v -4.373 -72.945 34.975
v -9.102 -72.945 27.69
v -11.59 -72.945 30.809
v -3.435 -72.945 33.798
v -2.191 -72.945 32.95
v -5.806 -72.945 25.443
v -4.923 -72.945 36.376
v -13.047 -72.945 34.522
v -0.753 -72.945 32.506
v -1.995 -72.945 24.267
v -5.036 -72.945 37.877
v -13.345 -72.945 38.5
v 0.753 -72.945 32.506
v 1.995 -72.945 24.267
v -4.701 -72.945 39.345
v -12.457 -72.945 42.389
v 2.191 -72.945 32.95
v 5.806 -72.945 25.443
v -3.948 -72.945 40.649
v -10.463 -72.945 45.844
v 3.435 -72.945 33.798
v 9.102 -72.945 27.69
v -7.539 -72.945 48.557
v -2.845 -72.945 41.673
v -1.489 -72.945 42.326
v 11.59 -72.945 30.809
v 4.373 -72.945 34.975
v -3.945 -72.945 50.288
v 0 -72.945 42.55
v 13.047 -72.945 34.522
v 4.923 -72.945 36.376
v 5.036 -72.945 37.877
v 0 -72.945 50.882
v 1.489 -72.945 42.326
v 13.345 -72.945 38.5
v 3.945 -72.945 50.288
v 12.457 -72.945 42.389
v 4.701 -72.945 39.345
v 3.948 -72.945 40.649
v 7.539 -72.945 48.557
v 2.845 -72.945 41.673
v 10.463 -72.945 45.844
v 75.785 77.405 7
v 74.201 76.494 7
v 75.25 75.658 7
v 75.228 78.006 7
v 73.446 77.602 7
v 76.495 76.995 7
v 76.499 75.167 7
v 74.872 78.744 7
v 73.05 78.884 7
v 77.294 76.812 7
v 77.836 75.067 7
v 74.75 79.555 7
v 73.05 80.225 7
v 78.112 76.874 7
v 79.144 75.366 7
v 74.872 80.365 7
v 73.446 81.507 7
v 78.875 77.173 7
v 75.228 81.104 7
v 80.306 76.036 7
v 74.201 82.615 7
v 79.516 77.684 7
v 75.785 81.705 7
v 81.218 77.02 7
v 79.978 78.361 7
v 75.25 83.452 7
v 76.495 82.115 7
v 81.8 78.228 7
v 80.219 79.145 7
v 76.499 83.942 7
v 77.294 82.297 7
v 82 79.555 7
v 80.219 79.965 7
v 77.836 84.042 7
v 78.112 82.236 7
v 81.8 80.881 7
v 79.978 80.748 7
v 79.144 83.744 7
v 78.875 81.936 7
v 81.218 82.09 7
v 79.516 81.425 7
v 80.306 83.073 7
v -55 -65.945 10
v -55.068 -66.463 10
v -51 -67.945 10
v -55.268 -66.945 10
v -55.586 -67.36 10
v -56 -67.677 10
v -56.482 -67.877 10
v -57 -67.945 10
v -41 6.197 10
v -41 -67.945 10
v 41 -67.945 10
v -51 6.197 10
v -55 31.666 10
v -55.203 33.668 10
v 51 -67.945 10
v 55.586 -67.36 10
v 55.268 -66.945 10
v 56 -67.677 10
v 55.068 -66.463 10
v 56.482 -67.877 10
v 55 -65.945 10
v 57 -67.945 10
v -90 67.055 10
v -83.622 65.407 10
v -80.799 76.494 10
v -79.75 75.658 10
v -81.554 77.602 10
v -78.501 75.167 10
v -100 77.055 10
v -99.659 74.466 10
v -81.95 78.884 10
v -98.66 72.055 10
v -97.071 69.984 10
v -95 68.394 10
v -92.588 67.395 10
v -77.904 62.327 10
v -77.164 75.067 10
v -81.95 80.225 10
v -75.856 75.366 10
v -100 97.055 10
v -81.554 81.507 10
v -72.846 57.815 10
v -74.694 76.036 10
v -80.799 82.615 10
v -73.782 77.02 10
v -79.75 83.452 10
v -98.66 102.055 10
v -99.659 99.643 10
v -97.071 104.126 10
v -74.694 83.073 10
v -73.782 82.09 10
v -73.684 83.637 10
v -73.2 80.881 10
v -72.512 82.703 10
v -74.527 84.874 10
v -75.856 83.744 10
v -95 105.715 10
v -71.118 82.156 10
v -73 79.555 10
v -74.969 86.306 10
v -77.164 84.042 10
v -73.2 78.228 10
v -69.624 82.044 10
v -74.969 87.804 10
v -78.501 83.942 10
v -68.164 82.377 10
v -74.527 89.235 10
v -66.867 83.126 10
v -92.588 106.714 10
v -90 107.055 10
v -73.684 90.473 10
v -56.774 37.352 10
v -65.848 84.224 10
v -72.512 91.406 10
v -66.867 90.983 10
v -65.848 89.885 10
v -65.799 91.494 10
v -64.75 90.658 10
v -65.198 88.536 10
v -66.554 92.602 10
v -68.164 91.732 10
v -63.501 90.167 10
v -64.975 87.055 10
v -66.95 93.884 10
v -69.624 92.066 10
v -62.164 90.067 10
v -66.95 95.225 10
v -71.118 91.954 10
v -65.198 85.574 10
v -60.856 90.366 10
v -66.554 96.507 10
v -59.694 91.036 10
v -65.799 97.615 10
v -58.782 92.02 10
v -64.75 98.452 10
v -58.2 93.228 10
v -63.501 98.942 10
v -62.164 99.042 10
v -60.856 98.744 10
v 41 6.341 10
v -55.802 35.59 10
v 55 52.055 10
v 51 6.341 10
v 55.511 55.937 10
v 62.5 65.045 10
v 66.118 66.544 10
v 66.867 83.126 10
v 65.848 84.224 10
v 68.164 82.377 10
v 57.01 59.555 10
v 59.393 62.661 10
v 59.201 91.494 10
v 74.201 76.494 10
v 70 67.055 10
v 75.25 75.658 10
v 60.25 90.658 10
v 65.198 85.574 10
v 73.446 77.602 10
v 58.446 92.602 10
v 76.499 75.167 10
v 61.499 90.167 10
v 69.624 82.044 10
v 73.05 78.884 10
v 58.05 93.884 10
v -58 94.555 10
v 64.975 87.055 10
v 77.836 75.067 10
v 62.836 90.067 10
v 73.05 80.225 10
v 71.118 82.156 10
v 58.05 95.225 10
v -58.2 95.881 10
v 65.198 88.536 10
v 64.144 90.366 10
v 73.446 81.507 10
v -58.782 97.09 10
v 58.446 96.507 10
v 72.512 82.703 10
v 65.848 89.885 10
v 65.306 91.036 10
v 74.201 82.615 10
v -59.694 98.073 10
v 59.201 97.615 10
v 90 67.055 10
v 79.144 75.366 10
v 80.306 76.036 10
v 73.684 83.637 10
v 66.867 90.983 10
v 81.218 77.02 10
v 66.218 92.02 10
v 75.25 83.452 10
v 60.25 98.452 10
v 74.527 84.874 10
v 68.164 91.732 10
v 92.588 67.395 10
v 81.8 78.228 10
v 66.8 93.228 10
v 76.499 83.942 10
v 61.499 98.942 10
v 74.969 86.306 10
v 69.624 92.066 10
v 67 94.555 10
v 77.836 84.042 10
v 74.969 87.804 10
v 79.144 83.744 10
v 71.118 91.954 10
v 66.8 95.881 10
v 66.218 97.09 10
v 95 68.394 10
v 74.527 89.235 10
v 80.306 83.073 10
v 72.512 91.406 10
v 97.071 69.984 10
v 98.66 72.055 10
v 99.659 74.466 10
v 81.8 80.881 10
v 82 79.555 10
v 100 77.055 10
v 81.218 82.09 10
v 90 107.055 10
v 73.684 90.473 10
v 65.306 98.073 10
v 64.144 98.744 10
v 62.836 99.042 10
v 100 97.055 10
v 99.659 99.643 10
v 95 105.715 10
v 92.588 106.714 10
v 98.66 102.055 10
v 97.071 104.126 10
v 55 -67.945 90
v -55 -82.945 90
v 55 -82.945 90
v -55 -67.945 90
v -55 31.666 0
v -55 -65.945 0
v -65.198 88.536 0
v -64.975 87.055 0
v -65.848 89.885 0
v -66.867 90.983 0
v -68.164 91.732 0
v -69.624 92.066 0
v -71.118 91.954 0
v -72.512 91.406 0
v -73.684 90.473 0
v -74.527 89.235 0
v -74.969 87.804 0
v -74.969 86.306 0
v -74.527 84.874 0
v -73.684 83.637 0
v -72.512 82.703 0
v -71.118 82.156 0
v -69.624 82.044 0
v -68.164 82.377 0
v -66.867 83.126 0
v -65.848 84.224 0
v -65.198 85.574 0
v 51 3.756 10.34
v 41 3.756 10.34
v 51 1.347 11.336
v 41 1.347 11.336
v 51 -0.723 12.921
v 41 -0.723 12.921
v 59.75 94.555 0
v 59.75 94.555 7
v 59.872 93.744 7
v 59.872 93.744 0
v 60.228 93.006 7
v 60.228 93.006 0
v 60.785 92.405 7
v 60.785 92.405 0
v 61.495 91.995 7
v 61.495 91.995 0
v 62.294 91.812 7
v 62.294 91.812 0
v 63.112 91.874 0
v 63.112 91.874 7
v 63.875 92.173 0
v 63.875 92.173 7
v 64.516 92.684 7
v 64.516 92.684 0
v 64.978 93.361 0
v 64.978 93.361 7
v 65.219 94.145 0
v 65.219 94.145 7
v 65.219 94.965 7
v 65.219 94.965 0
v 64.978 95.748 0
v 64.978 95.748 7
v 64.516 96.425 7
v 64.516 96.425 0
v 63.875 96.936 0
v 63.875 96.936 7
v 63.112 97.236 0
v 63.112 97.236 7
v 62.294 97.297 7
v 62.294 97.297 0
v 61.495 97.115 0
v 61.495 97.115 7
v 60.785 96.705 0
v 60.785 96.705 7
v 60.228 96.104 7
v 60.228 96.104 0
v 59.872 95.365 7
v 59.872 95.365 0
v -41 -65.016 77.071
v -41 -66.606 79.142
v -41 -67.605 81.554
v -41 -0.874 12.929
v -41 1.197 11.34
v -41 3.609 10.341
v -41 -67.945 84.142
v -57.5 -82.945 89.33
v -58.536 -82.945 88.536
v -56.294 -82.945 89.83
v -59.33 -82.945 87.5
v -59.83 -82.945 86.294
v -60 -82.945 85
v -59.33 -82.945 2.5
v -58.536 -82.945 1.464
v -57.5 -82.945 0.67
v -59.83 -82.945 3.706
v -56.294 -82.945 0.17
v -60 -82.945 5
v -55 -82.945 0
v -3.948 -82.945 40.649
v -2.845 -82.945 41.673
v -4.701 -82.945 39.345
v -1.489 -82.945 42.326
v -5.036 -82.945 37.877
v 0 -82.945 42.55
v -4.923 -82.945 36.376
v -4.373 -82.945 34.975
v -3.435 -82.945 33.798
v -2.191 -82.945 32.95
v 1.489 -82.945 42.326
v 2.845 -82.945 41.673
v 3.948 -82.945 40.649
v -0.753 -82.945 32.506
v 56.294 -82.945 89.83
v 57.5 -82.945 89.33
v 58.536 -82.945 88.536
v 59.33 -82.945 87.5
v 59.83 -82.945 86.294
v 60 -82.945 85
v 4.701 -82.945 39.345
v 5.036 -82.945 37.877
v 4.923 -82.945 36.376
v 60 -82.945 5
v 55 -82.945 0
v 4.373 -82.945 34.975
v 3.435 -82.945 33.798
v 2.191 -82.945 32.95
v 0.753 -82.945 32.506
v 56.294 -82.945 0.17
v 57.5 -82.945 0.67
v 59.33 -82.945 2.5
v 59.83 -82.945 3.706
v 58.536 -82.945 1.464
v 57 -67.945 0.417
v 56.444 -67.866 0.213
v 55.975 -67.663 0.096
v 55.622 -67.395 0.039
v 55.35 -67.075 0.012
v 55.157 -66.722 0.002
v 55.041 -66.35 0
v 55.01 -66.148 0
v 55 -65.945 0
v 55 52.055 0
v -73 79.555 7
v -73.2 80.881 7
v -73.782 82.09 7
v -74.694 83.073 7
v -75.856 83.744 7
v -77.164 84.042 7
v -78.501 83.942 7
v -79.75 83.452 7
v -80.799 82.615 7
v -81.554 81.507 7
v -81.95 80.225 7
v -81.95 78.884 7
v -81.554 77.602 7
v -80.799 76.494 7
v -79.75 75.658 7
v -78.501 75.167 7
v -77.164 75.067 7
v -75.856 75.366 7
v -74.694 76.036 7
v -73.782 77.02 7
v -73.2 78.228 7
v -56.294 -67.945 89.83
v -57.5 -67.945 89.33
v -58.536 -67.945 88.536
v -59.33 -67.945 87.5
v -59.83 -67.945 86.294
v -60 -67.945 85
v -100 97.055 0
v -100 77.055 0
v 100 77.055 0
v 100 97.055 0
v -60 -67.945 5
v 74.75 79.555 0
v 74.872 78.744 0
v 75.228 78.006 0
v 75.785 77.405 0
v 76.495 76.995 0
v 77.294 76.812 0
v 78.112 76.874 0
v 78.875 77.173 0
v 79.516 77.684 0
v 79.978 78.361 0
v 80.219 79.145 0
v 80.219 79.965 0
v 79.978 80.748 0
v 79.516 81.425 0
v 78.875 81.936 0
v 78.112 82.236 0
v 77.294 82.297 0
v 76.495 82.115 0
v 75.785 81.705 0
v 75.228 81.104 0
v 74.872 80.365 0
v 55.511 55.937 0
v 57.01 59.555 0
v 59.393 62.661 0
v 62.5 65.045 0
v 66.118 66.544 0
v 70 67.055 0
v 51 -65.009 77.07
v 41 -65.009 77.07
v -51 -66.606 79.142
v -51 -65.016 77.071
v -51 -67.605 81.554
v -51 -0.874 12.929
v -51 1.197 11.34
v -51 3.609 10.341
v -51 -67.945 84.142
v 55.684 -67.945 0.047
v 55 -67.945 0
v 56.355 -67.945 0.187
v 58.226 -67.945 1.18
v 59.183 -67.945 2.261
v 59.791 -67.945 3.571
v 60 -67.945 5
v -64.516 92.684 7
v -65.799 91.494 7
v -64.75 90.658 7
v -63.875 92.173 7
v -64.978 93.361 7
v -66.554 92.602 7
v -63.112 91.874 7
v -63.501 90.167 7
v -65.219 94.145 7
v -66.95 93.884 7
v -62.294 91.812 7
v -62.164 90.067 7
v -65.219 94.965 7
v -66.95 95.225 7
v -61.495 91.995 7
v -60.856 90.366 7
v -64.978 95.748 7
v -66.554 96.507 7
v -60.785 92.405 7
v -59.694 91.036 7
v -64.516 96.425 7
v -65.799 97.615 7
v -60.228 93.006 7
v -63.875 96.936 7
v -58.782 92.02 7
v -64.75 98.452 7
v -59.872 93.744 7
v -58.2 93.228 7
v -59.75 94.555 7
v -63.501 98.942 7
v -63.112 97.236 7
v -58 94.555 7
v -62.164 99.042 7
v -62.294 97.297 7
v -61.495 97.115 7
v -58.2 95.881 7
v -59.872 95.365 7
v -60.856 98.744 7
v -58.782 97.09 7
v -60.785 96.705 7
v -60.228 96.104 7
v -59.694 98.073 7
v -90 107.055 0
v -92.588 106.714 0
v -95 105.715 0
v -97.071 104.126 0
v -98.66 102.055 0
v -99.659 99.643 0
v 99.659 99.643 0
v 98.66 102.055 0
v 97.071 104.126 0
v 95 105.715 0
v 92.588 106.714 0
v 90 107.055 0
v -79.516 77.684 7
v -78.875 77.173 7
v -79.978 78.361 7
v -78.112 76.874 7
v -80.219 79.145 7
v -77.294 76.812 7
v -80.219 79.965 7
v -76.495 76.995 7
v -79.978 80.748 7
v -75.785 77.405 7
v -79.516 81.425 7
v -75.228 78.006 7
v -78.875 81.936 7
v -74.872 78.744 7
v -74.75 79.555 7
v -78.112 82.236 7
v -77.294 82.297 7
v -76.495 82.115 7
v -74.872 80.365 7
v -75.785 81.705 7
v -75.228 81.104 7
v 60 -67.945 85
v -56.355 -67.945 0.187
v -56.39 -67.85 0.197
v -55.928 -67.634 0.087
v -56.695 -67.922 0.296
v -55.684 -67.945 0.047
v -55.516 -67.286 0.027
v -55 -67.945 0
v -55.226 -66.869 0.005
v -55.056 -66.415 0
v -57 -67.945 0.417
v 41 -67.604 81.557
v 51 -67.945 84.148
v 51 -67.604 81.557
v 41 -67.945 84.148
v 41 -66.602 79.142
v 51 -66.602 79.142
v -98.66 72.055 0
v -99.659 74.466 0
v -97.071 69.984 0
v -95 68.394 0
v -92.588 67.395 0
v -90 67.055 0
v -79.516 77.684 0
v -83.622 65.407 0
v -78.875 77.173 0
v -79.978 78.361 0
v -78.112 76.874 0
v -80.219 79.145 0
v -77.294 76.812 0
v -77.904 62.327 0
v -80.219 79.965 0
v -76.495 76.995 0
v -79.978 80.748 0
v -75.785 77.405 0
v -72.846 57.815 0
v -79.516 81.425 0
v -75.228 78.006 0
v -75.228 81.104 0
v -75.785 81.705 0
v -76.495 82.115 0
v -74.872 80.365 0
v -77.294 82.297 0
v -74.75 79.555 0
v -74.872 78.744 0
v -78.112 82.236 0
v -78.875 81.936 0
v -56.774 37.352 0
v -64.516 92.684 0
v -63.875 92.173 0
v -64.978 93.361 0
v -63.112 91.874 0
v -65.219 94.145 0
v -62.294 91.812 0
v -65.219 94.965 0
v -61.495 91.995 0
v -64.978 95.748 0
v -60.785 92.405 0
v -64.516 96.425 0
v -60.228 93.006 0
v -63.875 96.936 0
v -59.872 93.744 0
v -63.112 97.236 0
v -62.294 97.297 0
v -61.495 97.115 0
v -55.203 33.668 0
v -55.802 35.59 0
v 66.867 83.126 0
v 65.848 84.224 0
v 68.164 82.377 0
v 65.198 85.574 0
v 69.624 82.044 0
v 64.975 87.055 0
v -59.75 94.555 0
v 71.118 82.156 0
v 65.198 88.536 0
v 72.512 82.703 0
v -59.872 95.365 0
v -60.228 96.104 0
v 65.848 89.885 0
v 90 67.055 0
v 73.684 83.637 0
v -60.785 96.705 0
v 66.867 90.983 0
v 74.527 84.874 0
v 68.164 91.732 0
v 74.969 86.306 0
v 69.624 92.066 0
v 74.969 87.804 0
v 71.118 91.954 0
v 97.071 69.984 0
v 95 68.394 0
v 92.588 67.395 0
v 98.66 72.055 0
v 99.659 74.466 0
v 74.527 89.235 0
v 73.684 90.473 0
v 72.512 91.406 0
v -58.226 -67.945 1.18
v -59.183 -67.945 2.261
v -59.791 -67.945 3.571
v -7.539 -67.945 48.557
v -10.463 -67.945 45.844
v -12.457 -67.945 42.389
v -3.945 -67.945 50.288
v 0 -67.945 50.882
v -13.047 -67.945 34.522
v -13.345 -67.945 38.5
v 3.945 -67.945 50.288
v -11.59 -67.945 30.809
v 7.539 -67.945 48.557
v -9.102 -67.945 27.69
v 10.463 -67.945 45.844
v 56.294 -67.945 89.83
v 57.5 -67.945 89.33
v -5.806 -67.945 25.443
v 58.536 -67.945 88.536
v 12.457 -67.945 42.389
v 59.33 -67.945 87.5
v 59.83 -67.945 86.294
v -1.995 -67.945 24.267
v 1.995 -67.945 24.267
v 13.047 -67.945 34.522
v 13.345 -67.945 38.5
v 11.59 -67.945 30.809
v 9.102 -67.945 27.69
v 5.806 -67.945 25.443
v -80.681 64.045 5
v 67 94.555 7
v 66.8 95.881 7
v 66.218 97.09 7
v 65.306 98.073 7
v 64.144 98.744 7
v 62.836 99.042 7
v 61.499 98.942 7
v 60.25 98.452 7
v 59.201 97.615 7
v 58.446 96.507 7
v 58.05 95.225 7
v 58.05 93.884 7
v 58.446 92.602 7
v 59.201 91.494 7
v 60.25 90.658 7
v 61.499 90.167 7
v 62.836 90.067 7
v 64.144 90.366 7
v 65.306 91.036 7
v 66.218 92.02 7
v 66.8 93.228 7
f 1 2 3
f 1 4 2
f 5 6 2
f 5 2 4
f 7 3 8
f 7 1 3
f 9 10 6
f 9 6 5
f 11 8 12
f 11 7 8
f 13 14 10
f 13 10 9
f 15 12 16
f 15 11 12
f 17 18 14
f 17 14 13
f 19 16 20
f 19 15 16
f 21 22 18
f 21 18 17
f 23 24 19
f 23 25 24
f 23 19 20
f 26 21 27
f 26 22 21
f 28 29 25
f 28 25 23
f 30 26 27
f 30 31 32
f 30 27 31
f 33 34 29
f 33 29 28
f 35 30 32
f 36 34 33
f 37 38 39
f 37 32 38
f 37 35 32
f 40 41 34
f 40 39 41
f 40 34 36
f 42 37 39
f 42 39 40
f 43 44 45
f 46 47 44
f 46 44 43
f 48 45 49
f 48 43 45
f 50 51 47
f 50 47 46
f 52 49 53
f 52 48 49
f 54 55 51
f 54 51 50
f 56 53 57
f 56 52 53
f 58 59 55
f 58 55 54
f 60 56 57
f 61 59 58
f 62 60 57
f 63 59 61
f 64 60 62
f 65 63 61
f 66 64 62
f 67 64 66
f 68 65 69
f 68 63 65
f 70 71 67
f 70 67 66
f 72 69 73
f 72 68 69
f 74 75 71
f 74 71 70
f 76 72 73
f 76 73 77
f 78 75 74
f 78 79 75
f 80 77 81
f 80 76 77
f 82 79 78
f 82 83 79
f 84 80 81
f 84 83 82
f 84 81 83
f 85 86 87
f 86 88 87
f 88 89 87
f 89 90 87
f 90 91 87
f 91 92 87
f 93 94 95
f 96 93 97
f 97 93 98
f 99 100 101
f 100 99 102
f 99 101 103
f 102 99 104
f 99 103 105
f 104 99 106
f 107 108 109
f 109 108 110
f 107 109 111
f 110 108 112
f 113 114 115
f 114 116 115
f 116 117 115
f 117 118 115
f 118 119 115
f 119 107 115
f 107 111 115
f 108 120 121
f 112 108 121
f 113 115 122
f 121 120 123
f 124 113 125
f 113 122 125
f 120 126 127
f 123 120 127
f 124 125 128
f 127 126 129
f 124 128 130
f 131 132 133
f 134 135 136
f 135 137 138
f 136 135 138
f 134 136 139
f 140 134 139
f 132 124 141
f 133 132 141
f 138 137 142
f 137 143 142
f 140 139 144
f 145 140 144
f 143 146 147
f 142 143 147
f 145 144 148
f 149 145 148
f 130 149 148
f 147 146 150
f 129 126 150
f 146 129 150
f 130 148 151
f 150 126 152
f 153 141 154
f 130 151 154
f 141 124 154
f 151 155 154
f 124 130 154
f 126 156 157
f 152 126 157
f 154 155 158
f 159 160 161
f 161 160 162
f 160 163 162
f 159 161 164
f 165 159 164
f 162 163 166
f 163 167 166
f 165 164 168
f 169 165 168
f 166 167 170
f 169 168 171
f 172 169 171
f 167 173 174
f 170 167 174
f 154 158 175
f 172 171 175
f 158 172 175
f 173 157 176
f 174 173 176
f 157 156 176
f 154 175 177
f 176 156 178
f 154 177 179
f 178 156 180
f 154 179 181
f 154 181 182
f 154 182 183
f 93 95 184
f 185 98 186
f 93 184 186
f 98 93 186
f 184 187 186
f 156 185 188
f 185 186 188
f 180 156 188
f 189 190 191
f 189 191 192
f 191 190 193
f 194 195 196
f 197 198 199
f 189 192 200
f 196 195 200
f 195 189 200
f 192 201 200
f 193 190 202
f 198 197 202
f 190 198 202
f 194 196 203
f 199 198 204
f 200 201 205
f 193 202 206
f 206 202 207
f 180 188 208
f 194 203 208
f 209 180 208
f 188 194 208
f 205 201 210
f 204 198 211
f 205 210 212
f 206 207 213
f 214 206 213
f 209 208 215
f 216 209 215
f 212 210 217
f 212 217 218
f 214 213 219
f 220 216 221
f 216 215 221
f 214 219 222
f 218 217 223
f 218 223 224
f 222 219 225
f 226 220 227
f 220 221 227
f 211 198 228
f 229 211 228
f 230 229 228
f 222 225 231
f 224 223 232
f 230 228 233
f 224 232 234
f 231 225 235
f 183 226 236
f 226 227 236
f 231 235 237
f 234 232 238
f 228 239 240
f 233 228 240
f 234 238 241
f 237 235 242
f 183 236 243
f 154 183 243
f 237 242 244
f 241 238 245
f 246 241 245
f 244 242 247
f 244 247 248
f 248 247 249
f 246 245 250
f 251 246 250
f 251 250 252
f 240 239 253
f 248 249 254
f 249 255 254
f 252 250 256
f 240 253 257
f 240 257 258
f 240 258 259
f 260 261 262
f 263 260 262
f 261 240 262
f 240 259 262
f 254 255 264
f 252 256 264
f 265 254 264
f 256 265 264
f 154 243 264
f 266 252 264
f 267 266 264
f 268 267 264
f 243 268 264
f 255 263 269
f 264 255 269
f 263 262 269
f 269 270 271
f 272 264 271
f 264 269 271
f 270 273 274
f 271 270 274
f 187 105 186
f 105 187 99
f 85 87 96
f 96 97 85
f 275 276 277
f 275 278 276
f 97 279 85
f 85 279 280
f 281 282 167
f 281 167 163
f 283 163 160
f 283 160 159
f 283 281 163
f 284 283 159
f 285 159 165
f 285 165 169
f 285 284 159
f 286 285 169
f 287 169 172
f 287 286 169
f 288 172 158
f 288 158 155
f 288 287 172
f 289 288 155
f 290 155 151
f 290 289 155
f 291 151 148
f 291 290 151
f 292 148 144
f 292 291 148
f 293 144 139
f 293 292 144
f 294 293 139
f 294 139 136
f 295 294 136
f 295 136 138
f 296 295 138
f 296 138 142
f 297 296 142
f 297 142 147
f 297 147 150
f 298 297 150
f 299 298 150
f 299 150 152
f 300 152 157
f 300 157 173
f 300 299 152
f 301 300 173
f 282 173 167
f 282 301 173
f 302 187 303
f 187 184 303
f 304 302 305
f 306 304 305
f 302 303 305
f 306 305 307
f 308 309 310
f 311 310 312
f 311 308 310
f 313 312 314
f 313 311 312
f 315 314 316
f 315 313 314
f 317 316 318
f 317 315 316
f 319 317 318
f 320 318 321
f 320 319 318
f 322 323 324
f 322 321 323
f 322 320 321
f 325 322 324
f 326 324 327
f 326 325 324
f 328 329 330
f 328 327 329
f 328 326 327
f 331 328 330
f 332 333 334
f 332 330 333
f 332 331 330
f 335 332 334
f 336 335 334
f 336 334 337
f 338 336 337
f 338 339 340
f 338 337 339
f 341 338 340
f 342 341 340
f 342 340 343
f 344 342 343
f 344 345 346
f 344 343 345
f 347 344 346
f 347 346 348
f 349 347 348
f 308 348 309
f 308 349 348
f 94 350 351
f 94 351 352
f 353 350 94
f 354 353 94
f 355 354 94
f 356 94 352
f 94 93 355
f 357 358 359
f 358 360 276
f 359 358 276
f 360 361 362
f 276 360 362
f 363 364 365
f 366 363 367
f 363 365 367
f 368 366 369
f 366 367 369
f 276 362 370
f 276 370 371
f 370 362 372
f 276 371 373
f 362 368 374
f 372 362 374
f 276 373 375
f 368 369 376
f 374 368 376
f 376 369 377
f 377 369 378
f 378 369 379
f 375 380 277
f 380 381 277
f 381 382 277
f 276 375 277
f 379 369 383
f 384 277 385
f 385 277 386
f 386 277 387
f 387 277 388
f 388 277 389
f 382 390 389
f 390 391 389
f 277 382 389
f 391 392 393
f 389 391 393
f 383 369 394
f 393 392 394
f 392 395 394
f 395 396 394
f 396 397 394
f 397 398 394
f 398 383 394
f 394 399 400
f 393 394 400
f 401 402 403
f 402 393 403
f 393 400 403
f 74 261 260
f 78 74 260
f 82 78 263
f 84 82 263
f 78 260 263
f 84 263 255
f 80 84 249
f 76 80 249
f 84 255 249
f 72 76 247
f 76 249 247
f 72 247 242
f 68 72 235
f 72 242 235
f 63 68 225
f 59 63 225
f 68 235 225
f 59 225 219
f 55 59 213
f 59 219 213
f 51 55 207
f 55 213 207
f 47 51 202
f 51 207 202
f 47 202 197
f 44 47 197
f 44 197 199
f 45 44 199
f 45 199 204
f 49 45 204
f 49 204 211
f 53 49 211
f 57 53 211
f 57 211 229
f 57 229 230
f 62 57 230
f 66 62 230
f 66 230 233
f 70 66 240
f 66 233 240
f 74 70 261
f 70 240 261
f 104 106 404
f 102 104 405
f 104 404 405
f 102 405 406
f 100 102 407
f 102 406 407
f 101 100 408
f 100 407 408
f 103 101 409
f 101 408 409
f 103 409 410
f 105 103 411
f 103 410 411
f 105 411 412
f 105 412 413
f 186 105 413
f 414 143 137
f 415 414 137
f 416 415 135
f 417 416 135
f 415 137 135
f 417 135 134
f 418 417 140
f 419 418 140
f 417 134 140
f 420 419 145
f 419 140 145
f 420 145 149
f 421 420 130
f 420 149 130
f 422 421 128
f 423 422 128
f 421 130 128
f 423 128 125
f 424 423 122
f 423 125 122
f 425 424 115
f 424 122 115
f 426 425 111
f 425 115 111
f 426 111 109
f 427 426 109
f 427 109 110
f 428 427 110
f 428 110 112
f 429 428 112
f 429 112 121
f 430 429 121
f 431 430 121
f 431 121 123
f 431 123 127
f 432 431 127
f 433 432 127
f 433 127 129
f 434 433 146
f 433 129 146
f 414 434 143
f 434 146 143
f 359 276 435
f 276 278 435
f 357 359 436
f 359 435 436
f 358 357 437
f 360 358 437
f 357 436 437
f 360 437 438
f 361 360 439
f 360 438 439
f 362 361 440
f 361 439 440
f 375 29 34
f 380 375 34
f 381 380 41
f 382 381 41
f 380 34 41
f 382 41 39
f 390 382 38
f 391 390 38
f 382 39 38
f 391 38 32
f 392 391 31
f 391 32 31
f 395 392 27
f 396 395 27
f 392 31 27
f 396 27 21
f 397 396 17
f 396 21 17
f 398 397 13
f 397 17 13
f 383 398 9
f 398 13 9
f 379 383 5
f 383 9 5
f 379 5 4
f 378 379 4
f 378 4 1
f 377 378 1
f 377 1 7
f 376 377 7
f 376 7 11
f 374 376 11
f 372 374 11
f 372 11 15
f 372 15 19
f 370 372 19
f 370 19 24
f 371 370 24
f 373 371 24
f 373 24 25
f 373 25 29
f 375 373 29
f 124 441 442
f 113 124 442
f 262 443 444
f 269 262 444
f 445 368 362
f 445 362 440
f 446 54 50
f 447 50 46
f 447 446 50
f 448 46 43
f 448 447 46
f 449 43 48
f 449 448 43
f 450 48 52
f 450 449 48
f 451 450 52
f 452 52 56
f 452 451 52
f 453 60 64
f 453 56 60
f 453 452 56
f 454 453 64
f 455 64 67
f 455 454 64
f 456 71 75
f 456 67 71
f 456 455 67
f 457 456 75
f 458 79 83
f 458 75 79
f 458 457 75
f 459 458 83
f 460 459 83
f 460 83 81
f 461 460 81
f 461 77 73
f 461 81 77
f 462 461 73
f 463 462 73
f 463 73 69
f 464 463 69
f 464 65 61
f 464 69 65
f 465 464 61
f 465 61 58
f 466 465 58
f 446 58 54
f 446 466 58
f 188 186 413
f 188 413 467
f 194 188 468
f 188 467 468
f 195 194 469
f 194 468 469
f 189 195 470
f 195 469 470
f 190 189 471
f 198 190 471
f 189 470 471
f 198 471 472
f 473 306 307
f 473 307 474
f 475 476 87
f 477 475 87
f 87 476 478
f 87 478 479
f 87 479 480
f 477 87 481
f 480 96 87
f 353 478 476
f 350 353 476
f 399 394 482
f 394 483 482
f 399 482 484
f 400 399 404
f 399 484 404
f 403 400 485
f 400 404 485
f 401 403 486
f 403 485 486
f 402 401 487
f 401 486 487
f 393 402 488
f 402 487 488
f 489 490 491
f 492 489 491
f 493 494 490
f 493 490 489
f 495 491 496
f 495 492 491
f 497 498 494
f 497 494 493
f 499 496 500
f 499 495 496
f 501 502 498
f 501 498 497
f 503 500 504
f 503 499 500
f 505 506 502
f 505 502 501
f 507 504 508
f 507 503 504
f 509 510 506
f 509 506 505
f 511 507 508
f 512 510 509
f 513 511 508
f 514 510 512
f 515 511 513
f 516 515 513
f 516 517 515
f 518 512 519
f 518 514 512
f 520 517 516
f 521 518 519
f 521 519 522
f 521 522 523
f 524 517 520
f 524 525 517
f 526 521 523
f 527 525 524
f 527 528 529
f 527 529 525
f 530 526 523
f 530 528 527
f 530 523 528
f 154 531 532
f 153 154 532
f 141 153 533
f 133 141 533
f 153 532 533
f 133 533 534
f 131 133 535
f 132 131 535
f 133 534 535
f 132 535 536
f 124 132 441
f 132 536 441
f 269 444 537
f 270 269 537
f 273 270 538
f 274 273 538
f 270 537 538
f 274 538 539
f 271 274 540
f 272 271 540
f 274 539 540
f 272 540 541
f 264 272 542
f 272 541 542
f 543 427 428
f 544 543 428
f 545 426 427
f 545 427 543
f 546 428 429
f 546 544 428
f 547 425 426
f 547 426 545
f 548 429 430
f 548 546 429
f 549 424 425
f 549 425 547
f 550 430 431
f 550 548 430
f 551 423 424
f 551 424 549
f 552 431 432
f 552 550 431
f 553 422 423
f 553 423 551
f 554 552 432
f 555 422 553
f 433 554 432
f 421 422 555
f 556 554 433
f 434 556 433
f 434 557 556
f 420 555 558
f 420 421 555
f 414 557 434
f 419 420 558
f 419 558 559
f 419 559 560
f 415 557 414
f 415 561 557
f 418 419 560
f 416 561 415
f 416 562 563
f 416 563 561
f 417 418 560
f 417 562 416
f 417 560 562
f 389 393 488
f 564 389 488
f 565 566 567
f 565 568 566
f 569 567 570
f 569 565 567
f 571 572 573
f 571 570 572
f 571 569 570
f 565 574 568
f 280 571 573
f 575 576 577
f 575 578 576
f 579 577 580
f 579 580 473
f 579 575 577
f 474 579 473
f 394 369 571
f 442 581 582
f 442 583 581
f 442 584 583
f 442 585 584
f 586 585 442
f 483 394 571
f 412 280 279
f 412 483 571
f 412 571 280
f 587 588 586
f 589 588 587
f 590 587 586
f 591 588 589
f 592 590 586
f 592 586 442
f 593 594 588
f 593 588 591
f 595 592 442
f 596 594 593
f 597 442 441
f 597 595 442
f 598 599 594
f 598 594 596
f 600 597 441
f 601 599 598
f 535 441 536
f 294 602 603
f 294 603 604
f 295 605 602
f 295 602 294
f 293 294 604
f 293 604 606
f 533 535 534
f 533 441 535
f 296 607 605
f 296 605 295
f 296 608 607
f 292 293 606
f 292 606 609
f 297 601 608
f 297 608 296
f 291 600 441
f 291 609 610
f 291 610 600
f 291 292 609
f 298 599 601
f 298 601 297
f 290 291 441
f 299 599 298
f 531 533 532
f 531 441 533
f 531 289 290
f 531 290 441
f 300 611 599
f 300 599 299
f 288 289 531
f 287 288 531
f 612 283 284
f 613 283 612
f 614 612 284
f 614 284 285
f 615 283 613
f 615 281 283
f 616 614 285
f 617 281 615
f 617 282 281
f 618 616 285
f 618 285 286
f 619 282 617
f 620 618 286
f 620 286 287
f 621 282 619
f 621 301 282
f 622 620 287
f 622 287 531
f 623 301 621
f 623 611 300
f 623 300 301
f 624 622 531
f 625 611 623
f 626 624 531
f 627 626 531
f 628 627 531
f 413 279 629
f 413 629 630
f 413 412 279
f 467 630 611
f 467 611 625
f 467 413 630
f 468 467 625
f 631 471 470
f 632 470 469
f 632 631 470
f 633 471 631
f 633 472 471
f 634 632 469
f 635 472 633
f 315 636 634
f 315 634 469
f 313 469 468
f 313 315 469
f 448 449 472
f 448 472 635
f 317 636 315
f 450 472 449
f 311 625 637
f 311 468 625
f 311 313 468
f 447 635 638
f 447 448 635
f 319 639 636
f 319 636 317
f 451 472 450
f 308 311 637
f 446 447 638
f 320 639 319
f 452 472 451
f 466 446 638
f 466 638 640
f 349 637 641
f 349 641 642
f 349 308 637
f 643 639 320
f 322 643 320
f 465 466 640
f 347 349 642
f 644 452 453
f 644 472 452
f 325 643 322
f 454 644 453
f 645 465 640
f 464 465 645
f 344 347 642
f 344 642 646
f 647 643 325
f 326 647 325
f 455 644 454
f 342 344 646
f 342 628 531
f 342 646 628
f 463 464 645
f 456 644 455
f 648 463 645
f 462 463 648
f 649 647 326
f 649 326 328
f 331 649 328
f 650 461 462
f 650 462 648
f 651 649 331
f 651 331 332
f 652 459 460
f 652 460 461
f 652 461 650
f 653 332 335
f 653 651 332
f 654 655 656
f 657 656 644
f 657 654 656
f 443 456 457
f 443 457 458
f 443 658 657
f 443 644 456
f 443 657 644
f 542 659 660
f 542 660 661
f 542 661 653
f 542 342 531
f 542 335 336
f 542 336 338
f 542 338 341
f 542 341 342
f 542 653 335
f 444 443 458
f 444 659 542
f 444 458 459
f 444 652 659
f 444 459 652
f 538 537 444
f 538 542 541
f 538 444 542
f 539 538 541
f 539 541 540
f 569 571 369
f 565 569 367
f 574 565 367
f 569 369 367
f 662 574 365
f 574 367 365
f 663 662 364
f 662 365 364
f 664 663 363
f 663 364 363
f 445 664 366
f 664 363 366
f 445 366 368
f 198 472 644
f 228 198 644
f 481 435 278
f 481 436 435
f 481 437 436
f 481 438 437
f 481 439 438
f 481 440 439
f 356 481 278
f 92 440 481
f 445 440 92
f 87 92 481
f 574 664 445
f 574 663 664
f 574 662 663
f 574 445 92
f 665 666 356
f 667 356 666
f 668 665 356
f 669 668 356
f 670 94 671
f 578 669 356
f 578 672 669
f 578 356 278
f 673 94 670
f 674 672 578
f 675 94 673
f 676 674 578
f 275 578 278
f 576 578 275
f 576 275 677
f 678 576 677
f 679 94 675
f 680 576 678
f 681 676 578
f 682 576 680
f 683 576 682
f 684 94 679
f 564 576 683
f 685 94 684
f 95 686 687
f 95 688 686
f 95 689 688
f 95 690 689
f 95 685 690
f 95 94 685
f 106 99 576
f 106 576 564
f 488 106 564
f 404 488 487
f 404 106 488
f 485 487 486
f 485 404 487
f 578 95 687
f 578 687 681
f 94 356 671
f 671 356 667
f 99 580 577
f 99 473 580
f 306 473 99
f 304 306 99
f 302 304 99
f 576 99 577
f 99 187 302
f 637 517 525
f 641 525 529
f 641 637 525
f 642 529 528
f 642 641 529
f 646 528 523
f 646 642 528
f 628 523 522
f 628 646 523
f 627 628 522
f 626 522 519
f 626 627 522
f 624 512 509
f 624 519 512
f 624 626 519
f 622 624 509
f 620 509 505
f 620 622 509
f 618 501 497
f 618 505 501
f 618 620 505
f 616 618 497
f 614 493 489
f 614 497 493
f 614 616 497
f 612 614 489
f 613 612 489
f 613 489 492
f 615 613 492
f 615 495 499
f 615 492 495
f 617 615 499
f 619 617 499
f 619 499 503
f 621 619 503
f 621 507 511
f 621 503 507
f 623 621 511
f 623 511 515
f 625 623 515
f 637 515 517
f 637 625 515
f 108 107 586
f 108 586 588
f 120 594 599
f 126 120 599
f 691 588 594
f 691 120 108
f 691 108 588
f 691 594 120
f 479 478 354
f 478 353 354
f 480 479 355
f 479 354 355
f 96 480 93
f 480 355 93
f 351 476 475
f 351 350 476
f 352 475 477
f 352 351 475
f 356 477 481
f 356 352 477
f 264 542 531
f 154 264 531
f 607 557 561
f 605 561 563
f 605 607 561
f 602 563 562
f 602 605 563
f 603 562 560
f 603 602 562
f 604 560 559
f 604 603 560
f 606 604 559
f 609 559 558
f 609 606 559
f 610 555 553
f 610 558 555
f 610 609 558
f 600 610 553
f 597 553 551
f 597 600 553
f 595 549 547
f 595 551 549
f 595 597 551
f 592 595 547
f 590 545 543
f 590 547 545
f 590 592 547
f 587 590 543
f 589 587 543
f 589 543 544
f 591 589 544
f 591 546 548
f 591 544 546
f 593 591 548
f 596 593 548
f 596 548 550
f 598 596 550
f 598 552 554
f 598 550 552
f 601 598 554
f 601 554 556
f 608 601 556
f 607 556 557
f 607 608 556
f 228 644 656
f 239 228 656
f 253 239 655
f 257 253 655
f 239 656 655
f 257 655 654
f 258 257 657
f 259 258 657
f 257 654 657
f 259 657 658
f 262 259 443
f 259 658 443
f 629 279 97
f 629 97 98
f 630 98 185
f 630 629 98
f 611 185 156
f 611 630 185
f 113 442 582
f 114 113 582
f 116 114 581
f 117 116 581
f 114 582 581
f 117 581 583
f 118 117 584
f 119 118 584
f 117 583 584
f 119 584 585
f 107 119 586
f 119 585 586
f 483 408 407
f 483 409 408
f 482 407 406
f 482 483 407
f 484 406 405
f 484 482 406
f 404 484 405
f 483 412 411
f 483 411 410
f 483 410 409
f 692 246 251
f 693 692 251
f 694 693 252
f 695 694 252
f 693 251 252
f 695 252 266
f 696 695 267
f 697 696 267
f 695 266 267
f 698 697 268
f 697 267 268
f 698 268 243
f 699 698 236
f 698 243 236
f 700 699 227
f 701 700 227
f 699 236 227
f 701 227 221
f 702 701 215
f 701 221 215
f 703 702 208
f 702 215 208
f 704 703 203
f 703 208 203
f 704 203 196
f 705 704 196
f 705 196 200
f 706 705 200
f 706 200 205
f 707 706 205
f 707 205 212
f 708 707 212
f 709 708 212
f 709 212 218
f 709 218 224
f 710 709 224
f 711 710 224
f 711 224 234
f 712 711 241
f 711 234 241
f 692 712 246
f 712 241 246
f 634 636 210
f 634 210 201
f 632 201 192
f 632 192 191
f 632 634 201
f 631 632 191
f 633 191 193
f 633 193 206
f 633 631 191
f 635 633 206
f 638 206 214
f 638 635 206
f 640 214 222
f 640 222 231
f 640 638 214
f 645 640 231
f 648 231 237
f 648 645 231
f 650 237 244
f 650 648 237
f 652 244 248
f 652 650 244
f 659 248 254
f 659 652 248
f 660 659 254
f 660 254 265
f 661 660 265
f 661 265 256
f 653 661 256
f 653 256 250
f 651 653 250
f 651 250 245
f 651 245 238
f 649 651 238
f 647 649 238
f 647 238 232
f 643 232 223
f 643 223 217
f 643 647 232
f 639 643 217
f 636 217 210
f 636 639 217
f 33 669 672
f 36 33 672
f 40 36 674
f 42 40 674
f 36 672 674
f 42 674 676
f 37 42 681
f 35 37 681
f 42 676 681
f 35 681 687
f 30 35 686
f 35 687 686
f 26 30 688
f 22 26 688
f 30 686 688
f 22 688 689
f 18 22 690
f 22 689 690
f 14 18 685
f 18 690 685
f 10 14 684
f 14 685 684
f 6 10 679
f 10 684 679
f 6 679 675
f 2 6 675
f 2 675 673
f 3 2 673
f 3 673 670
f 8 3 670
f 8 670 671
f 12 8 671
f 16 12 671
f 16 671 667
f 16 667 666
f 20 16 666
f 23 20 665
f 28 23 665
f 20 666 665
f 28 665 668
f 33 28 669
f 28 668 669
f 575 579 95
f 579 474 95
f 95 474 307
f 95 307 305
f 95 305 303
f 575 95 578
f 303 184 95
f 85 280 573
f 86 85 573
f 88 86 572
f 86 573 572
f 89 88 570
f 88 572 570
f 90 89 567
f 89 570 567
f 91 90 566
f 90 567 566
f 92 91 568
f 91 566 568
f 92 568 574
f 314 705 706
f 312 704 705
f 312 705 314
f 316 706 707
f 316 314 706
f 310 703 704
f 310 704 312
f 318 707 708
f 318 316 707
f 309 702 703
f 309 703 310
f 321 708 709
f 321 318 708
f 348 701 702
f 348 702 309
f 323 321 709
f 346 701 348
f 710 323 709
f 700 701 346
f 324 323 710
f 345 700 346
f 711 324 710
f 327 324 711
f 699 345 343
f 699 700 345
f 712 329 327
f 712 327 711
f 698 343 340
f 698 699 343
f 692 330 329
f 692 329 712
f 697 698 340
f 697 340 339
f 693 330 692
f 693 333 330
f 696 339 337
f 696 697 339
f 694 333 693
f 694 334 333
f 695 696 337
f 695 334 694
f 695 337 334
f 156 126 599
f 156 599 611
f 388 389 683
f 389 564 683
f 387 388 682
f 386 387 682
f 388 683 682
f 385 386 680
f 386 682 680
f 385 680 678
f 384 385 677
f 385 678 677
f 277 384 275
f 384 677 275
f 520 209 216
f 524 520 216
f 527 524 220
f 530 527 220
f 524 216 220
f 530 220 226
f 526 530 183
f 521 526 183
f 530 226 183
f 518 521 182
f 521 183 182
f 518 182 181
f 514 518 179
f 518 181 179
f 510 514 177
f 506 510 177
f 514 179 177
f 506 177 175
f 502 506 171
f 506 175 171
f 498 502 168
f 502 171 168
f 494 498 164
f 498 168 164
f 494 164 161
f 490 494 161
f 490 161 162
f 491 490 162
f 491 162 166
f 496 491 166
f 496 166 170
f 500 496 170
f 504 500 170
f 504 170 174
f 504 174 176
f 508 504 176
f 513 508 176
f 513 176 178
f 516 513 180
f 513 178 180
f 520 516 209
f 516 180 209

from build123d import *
from OCP.BRepAlgoAPI import BRepAlgoAPI_Cut
from OCP.TopTools import TopTools_ListOfShape

# Parameters (mm, degrees)
SKIZZE1_R                       = 5.025
SKIZZE1_R_2                     = 2.75
AUFSATZ_LINEAR_AUSTRAGEN1_DEPTH = 10
AUFSATZ_LINEAR_AUSTRAGEN3_DEPTH = 10
SKIZZE4_W                       = 120
SKIZZE4_H                       = 15
AUFSATZ_LINEAR_AUSTRAGEN4_DEPTH = 80
AUFSATZ_LINEAR_AUSTRAGEN5_DEPTH = 10
AUFSATZ_LINEAR_AUSTRAGEN6_DEPTH = 10
VERRUNDUNG3_R                   = 10
VERRUNDUNG4_R                   = 5
VERRUNDUNG5_R                   = 10
SKIZZE11_R                      = 4.5
SCHNITT_LINEAR_AUSTRAGEN1_DEPTH = 3
VERRUNDUNG6_START               = 5.0000001
VERRUNDUNG6_DEPTH               = 4.9999999
VERRUNDUNG6_START_2             = -1e-07
VERRUNDUNG6_2_DEPTH             = 5.0000002
VERRUNDUNG6_START_3             = -67.945354479
VERRUNDUNG6_3_DEPTH             = 2.945354479
SKIZZE13_R                      = 5.05
SCHNITT_LINEAR_AUSTRAGEN3_DEPTH = 221.737400671
SKIZZE14_R                      = 13.3825
SCHNITT_LINEAR_AUSTRAGEN4_DEPTH = 5


with BuildPart() as part:
    # Skizze1 → Aufsatz-Linear austragen1 (new body)
    with BuildSketch(Plane.XY):
        with BuildLine():
            Line((90, 107.054645521), (-90, 107.054645521))
            ThreePointArc((-90, 107.054645521), (-97.071067812, 104.125713333), (-100, 97.054645521))
            Line((-100, 97.054645521), (-100, 77.054645521))
            ThreePointArc((-100, 77.054645521), (-97.071067812, 69.983577709), (-90, 67.054645521))
            Line((-90, 67.054645521), (-70, 67.054645521))
            ThreePointArc((-70, 67.054645521), (-59.393398282, 62.661247239), (-55, 52.054645521))
            Line((-55, 52.054645521), (-55, -67.945354479))
            Line((-55, -67.945354479), (-60, -67.945354479))
            Line((-60, -67.945354479), (-60, -82.945354479))
            Line((-60, -82.945354479), (60, -82.945354479))
            Line((60, -82.945354479), (60, -67.945354479))
            Line((60, -67.945354479), (55, -67.945354479))
            Line((55, -67.945354479), (55, 52.054645521))
            ThreePointArc((55, 52.054645521), (59.393398282, 62.661247239), (70, 67.054645521))
            Line((70, 67.054645521), (90, 67.054645521))
            ThreePointArc((90, 67.054645521), (97.071067812, 69.983577709), (100, 77.054645521))
            Line((100, 77.054645521), (100, 97.054645521))
            ThreePointArc((100, 97.054645521), (97.071067812, 104.125713333), (90, 107.054645521))
        make_face()
        with Locations((-70, 87.054645521)):
            Circle(SKIZZE1_R, mode=Mode.SUBTRACT)
        with Locations((-62.5, 94.554645521)):
            Circle(SKIZZE1_R_2, mode=Mode.SUBTRACT)
        with Locations((-77.5, 79.554645521)):
            Circle(SKIZZE1_R_2, mode=Mode.SUBTRACT)
        with Locations(Location((77.5, 79.554645521, 0), (0, 0, 180))):
            Circle(SKIZZE1_R_2, mode=Mode.SUBTRACT)
        with Locations(Location((62.5, 94.554645521, 0), (0, 0, 180))):
            Circle(SKIZZE1_R_2, mode=Mode.SUBTRACT)
        with Locations(Location((70, 87.054645521, 0), (0, 0, 180))):
            Circle(SKIZZE1_R, mode=Mode.SUBTRACT)
    extrude(amount=AUFSATZ_LINEAR_AUSTRAGEN1_DEPTH)

    # Skizze3 → Aufsatz-Linear austragen3 (add)
    with BuildSketch(Plane.XY.offset(10)):
        with BuildLine():
            Line((-72.845922337, 57.814606503), (-56.774282723, 37.352261221))
            add(Edge.make_bspline(
                [(-55, 18.961003518), (-46.636539725, 27.963101216), (-56.774282723, 37.352261221)],
                knots=[0, 0, 0, 1, 1, 1], degree=2))
            Line((-55, 18.961003518), (-43.333440031, 21.200490786))
            Line((-43.333440031, 21.200490786), (-45.498025685, 67.054645521))
            Line((-45.498025685, 67.054645521), (-90, 67.054645521))
            add(Edge.make_bspline(
                [(-90, 67.054645521), (-79.938268155, 65.656359823), (-72.845922337, 57.814606503)],
                knots=[0, 0, 0, 1, 1, 1], degree=2))
        make_face()
    extrude(amount=-AUFSATZ_LINEAR_AUSTRAGEN3_DEPTH)

    # Skizze4 → Aufsatz-Linear austragen4 (add)
    with BuildSketch(Plane.XY.offset(10)):
        with Locations((0, -75.445354479)):
            Rectangle(SKIZZE4_W, SKIZZE4_H)
    extrude(amount=AUFSATZ_LINEAR_AUSTRAGEN4_DEPTH)

    # Skizze9 → Aufsatz-Linear austragen5 (add)
    with BuildSketch(Plane.ZY.offset(51)):
        Polygon((10, 2.054645521), (80, -67.945354479), (6.644184354, -67.945354479), (6.644184354, 2.054645521), align=None)
    extrude(amount=-AUFSATZ_LINEAR_AUSTRAGEN5_DEPTH)

    # Skizze10 → Aufsatz-Linear austragen6 (add)
    with BuildSketch(Plane(origin=(51, 0, 0), x_dir=(0, 0, -1), z_dir=(1, 0, 0))):
        Polygon((-10, 2.204645521), (-80, -67.945354479), (-10, -67.945354479), align=None)
    extrude(amount=-AUFSATZ_LINEAR_AUSTRAGEN6_DEPTH)

    # Verrundung3
    verrundung3_edges = [part.edges().sort_by_distance(p)[0] for p in [
        (-46, -67.945354479, 80),
        (-46, 2.054645521, 10),
        (46, 2.204645521, 10),
        (46, -67.945354479, 80),
    ]]
    fillet(verrundung3_edges, radius=VERRUNDUNG3_R)

    # Verrundung4
    verrundung4_edges = [part.edges().sort_by_distance(p)[0] for p in [
        (-60, -75.445354479, 90),
        (60, -75.445354479, 90),
        (60, -75.445354479, 0),
        (-60, -75.445354479, 0),
    ]]
    fillet(verrundung4_edges, radius=VERRUNDUNG4_R)

    # Verrundung5
    # the kernel refuses this fillet: 10 mm, written as the material it adds along each edge
    with BuildSketch(Plane(origin=(-55, 35.554962551, 0), x_dir=(0, -1, 0), z_dir=(0, 0, 1))) as verrundung5_piece_1:
        with BuildLine():
            CenterArc((3.889315022, -10), VERRUNDUNG5_R, 90, 34.65693161)
            Line((-1.79729867, -1.774282723), (-1.911030943, -1.609768377))
            ThreePointArc((-1.911030943, -1.609768377), (-1.060157902, -0.723908397), (-0.133322184, 0.14908117))
            Line((-0.133322184, 0.14908117), (0, 0.2))
            Line((0, 0.2), (3.889315022, 0.2))
            Line((3.889315022, 0.2), (3.889315022, 0))
        make_face()
    extrude(amount=10)

    # Skizze11 → Schnitt-Linear austragen1 (cut)
    with BuildSketch(Plane.XY.offset(10)):
        with Locations((62.5, 94.554645521)):
            Circle(SKIZZE11_R)
        with Locations((77.5, 79.554645521)):
            Circle(SKIZZE11_R)
        with Locations((-62.5, 94.554645521)):
            Circle(SKIZZE11_R)
        with Locations((-77.5, 79.554645521)):
            Circle(SKIZZE11_R)
    extrude(amount=-SCHNITT_LINEAR_AUSTRAGEN1_DEPTH, mode=Mode.SUBTRACT)


with BuildPart() as verrundung6_tool:
    # Verrundung6: read off the stored shape, not the designer's step
    # Verrundung6 outline → Verrundung6 (new body)
    with BuildSketch(Plane.XY.offset(VERRUNDUNG6_START)):
        with BuildLine():
            Line((-57, -67.945354479), (-55, -67.945354479))
            Line((-55, -67.945354479), (-55, -65.945354479))
            ThreePointArc((-55, -65.945354479), (-55.585786438, -67.359568041), (-57, -67.945354479))
        make_face()
        with BuildLine():
            ThreePointArc((57, -67.945354479), (55.585786438, -67.359568041), (55, -65.945354479))
            Line((55, -65.945354479), (55, -67.945354479))
            Line((55, -67.945354479), (57, -67.945354479))
        make_face()
    extrude(amount=VERRUNDUNG6_DEPTH)


with BuildPart() as part_1:
    add(part.part)


with BuildPart() as part_2:
    # Verrundung6: joined with verrundung6_tool
    add(part_1.part.fuse(verrundung6_tool.part, tol=0.00001))


with BuildPart() as verrundung6_2_tool:
    # Verrundung6 2 outline → Verrundung6 2 (new body)
    with BuildSketch(Plane.XY.offset(VERRUNDUNG6_START_2)):
        with BuildLine():
            Line((-57, -67.945354479), (-55, -67.945354479))
            Line((-55, -67.945354479), (-55, -65.945354479))
            ThreePointArc((-55, -65.945354479), (-55.585786438, -67.359568041), (-57, -67.945354479))
        make_face()
        with BuildLine():
            ThreePointArc((57, -67.945354479), (55.585786438, -67.359568041), (55, -65.945354479))
            Line((55, -65.945354479), (55, -67.945354479))
            Line((55, -67.945354479), (57, -67.945354479))
        make_face()
    extrude(amount=VERRUNDUNG6_2_DEPTH)


with BuildPart() as part_3:
    add(part_2.part)


with BuildPart() as part_4:
    # Verrundung6 2: joined with verrundung6_2_tool
    add(part_3.part.fuse(verrundung6_2_tool.part, tol=0.00001))


with BuildPart() as verrundung6_3_tool:
    # Verrundung6 3 outline → Verrundung6 3 (new body)
    with BuildSketch(Plane(origin=(0, 0, 0), x_dir=(1, 0, 0), z_dir=(0, 1, 0)).offset(VERRUNDUNG6_START_3)):
        with BuildLine():
            Line((59, -3.288e-06), (55, 0))
            ThreePointArc((55, 0), (57.236067978, -0.527864045), (59, -2))
            Line((59, -2), (59, -3.288e-06))
        make_face()
        with BuildLine():
            ThreePointArc((-59, -2), (-57.236067913, -0.527864013), (-54.999999856, 0))
            Line((-54.999999856, 0), (-59, -5e-09))
            Line((-59, -5e-09), (-59, -2))
        make_face()
    extrude(amount=VERRUNDUNG6_3_DEPTH)


with BuildPart() as part_5:
    add(part_4.part)

    # Verrundung6 3: cut by verrundung6_3_tool, with a tolerance
    verrundung6_3_stock = TopTools_ListOfShape()
    verrundung6_3_stock.Append(part_5.part.wrapped)
    verrundung6_3_tools = TopTools_ListOfShape()
    verrundung6_3_tools.Append(verrundung6_3_tool.part.wrapped)
    verrundung6_3_cut = BRepAlgoAPI_Cut()
    verrundung6_3_cut.SetArguments(verrundung6_3_stock)
    verrundung6_3_cut.SetTools(verrundung6_3_tools)
    verrundung6_3_cut.SetFuzzyValue(0.00001)
    verrundung6_3_cut.Build()
    add(Compound.cast(verrundung6_3_cut.Shape()).solids(), mode=Mode.REPLACE)

    # Skizze13 → Schnitt-Linear austragen3 (cut, through all)
    with BuildSketch(Plane(origin=(0, -67.945354479, 0), x_dir=(1, 0, 0), z_dir=(0, 1, 0))):
        with Locations(Location((0, -37.5, 0), (0, 0, 270))):
            Circle(SKIZZE13_R)
    extrude(amount=-SCHNITT_LINEAR_AUSTRAGEN3_DEPTH, mode=Mode.SUBTRACT)

    # Skizze14 → Schnitt-Linear austragen4 (cut)
    with BuildSketch(Plane(origin=(0, -67.945354479, 0), x_dir=(1, 0, 0), z_dir=(0, 1, 0))):
        with Locations(Location((0, -37.5, 0), (0, 0, 270))):
            Circle(SKIZZE14_R)
    extrude(amount=-SCHNITT_LINEAR_AUSTRAGEN4_DEPTH, mode=Mode.SUBTRACT)


solid = part_5.part
